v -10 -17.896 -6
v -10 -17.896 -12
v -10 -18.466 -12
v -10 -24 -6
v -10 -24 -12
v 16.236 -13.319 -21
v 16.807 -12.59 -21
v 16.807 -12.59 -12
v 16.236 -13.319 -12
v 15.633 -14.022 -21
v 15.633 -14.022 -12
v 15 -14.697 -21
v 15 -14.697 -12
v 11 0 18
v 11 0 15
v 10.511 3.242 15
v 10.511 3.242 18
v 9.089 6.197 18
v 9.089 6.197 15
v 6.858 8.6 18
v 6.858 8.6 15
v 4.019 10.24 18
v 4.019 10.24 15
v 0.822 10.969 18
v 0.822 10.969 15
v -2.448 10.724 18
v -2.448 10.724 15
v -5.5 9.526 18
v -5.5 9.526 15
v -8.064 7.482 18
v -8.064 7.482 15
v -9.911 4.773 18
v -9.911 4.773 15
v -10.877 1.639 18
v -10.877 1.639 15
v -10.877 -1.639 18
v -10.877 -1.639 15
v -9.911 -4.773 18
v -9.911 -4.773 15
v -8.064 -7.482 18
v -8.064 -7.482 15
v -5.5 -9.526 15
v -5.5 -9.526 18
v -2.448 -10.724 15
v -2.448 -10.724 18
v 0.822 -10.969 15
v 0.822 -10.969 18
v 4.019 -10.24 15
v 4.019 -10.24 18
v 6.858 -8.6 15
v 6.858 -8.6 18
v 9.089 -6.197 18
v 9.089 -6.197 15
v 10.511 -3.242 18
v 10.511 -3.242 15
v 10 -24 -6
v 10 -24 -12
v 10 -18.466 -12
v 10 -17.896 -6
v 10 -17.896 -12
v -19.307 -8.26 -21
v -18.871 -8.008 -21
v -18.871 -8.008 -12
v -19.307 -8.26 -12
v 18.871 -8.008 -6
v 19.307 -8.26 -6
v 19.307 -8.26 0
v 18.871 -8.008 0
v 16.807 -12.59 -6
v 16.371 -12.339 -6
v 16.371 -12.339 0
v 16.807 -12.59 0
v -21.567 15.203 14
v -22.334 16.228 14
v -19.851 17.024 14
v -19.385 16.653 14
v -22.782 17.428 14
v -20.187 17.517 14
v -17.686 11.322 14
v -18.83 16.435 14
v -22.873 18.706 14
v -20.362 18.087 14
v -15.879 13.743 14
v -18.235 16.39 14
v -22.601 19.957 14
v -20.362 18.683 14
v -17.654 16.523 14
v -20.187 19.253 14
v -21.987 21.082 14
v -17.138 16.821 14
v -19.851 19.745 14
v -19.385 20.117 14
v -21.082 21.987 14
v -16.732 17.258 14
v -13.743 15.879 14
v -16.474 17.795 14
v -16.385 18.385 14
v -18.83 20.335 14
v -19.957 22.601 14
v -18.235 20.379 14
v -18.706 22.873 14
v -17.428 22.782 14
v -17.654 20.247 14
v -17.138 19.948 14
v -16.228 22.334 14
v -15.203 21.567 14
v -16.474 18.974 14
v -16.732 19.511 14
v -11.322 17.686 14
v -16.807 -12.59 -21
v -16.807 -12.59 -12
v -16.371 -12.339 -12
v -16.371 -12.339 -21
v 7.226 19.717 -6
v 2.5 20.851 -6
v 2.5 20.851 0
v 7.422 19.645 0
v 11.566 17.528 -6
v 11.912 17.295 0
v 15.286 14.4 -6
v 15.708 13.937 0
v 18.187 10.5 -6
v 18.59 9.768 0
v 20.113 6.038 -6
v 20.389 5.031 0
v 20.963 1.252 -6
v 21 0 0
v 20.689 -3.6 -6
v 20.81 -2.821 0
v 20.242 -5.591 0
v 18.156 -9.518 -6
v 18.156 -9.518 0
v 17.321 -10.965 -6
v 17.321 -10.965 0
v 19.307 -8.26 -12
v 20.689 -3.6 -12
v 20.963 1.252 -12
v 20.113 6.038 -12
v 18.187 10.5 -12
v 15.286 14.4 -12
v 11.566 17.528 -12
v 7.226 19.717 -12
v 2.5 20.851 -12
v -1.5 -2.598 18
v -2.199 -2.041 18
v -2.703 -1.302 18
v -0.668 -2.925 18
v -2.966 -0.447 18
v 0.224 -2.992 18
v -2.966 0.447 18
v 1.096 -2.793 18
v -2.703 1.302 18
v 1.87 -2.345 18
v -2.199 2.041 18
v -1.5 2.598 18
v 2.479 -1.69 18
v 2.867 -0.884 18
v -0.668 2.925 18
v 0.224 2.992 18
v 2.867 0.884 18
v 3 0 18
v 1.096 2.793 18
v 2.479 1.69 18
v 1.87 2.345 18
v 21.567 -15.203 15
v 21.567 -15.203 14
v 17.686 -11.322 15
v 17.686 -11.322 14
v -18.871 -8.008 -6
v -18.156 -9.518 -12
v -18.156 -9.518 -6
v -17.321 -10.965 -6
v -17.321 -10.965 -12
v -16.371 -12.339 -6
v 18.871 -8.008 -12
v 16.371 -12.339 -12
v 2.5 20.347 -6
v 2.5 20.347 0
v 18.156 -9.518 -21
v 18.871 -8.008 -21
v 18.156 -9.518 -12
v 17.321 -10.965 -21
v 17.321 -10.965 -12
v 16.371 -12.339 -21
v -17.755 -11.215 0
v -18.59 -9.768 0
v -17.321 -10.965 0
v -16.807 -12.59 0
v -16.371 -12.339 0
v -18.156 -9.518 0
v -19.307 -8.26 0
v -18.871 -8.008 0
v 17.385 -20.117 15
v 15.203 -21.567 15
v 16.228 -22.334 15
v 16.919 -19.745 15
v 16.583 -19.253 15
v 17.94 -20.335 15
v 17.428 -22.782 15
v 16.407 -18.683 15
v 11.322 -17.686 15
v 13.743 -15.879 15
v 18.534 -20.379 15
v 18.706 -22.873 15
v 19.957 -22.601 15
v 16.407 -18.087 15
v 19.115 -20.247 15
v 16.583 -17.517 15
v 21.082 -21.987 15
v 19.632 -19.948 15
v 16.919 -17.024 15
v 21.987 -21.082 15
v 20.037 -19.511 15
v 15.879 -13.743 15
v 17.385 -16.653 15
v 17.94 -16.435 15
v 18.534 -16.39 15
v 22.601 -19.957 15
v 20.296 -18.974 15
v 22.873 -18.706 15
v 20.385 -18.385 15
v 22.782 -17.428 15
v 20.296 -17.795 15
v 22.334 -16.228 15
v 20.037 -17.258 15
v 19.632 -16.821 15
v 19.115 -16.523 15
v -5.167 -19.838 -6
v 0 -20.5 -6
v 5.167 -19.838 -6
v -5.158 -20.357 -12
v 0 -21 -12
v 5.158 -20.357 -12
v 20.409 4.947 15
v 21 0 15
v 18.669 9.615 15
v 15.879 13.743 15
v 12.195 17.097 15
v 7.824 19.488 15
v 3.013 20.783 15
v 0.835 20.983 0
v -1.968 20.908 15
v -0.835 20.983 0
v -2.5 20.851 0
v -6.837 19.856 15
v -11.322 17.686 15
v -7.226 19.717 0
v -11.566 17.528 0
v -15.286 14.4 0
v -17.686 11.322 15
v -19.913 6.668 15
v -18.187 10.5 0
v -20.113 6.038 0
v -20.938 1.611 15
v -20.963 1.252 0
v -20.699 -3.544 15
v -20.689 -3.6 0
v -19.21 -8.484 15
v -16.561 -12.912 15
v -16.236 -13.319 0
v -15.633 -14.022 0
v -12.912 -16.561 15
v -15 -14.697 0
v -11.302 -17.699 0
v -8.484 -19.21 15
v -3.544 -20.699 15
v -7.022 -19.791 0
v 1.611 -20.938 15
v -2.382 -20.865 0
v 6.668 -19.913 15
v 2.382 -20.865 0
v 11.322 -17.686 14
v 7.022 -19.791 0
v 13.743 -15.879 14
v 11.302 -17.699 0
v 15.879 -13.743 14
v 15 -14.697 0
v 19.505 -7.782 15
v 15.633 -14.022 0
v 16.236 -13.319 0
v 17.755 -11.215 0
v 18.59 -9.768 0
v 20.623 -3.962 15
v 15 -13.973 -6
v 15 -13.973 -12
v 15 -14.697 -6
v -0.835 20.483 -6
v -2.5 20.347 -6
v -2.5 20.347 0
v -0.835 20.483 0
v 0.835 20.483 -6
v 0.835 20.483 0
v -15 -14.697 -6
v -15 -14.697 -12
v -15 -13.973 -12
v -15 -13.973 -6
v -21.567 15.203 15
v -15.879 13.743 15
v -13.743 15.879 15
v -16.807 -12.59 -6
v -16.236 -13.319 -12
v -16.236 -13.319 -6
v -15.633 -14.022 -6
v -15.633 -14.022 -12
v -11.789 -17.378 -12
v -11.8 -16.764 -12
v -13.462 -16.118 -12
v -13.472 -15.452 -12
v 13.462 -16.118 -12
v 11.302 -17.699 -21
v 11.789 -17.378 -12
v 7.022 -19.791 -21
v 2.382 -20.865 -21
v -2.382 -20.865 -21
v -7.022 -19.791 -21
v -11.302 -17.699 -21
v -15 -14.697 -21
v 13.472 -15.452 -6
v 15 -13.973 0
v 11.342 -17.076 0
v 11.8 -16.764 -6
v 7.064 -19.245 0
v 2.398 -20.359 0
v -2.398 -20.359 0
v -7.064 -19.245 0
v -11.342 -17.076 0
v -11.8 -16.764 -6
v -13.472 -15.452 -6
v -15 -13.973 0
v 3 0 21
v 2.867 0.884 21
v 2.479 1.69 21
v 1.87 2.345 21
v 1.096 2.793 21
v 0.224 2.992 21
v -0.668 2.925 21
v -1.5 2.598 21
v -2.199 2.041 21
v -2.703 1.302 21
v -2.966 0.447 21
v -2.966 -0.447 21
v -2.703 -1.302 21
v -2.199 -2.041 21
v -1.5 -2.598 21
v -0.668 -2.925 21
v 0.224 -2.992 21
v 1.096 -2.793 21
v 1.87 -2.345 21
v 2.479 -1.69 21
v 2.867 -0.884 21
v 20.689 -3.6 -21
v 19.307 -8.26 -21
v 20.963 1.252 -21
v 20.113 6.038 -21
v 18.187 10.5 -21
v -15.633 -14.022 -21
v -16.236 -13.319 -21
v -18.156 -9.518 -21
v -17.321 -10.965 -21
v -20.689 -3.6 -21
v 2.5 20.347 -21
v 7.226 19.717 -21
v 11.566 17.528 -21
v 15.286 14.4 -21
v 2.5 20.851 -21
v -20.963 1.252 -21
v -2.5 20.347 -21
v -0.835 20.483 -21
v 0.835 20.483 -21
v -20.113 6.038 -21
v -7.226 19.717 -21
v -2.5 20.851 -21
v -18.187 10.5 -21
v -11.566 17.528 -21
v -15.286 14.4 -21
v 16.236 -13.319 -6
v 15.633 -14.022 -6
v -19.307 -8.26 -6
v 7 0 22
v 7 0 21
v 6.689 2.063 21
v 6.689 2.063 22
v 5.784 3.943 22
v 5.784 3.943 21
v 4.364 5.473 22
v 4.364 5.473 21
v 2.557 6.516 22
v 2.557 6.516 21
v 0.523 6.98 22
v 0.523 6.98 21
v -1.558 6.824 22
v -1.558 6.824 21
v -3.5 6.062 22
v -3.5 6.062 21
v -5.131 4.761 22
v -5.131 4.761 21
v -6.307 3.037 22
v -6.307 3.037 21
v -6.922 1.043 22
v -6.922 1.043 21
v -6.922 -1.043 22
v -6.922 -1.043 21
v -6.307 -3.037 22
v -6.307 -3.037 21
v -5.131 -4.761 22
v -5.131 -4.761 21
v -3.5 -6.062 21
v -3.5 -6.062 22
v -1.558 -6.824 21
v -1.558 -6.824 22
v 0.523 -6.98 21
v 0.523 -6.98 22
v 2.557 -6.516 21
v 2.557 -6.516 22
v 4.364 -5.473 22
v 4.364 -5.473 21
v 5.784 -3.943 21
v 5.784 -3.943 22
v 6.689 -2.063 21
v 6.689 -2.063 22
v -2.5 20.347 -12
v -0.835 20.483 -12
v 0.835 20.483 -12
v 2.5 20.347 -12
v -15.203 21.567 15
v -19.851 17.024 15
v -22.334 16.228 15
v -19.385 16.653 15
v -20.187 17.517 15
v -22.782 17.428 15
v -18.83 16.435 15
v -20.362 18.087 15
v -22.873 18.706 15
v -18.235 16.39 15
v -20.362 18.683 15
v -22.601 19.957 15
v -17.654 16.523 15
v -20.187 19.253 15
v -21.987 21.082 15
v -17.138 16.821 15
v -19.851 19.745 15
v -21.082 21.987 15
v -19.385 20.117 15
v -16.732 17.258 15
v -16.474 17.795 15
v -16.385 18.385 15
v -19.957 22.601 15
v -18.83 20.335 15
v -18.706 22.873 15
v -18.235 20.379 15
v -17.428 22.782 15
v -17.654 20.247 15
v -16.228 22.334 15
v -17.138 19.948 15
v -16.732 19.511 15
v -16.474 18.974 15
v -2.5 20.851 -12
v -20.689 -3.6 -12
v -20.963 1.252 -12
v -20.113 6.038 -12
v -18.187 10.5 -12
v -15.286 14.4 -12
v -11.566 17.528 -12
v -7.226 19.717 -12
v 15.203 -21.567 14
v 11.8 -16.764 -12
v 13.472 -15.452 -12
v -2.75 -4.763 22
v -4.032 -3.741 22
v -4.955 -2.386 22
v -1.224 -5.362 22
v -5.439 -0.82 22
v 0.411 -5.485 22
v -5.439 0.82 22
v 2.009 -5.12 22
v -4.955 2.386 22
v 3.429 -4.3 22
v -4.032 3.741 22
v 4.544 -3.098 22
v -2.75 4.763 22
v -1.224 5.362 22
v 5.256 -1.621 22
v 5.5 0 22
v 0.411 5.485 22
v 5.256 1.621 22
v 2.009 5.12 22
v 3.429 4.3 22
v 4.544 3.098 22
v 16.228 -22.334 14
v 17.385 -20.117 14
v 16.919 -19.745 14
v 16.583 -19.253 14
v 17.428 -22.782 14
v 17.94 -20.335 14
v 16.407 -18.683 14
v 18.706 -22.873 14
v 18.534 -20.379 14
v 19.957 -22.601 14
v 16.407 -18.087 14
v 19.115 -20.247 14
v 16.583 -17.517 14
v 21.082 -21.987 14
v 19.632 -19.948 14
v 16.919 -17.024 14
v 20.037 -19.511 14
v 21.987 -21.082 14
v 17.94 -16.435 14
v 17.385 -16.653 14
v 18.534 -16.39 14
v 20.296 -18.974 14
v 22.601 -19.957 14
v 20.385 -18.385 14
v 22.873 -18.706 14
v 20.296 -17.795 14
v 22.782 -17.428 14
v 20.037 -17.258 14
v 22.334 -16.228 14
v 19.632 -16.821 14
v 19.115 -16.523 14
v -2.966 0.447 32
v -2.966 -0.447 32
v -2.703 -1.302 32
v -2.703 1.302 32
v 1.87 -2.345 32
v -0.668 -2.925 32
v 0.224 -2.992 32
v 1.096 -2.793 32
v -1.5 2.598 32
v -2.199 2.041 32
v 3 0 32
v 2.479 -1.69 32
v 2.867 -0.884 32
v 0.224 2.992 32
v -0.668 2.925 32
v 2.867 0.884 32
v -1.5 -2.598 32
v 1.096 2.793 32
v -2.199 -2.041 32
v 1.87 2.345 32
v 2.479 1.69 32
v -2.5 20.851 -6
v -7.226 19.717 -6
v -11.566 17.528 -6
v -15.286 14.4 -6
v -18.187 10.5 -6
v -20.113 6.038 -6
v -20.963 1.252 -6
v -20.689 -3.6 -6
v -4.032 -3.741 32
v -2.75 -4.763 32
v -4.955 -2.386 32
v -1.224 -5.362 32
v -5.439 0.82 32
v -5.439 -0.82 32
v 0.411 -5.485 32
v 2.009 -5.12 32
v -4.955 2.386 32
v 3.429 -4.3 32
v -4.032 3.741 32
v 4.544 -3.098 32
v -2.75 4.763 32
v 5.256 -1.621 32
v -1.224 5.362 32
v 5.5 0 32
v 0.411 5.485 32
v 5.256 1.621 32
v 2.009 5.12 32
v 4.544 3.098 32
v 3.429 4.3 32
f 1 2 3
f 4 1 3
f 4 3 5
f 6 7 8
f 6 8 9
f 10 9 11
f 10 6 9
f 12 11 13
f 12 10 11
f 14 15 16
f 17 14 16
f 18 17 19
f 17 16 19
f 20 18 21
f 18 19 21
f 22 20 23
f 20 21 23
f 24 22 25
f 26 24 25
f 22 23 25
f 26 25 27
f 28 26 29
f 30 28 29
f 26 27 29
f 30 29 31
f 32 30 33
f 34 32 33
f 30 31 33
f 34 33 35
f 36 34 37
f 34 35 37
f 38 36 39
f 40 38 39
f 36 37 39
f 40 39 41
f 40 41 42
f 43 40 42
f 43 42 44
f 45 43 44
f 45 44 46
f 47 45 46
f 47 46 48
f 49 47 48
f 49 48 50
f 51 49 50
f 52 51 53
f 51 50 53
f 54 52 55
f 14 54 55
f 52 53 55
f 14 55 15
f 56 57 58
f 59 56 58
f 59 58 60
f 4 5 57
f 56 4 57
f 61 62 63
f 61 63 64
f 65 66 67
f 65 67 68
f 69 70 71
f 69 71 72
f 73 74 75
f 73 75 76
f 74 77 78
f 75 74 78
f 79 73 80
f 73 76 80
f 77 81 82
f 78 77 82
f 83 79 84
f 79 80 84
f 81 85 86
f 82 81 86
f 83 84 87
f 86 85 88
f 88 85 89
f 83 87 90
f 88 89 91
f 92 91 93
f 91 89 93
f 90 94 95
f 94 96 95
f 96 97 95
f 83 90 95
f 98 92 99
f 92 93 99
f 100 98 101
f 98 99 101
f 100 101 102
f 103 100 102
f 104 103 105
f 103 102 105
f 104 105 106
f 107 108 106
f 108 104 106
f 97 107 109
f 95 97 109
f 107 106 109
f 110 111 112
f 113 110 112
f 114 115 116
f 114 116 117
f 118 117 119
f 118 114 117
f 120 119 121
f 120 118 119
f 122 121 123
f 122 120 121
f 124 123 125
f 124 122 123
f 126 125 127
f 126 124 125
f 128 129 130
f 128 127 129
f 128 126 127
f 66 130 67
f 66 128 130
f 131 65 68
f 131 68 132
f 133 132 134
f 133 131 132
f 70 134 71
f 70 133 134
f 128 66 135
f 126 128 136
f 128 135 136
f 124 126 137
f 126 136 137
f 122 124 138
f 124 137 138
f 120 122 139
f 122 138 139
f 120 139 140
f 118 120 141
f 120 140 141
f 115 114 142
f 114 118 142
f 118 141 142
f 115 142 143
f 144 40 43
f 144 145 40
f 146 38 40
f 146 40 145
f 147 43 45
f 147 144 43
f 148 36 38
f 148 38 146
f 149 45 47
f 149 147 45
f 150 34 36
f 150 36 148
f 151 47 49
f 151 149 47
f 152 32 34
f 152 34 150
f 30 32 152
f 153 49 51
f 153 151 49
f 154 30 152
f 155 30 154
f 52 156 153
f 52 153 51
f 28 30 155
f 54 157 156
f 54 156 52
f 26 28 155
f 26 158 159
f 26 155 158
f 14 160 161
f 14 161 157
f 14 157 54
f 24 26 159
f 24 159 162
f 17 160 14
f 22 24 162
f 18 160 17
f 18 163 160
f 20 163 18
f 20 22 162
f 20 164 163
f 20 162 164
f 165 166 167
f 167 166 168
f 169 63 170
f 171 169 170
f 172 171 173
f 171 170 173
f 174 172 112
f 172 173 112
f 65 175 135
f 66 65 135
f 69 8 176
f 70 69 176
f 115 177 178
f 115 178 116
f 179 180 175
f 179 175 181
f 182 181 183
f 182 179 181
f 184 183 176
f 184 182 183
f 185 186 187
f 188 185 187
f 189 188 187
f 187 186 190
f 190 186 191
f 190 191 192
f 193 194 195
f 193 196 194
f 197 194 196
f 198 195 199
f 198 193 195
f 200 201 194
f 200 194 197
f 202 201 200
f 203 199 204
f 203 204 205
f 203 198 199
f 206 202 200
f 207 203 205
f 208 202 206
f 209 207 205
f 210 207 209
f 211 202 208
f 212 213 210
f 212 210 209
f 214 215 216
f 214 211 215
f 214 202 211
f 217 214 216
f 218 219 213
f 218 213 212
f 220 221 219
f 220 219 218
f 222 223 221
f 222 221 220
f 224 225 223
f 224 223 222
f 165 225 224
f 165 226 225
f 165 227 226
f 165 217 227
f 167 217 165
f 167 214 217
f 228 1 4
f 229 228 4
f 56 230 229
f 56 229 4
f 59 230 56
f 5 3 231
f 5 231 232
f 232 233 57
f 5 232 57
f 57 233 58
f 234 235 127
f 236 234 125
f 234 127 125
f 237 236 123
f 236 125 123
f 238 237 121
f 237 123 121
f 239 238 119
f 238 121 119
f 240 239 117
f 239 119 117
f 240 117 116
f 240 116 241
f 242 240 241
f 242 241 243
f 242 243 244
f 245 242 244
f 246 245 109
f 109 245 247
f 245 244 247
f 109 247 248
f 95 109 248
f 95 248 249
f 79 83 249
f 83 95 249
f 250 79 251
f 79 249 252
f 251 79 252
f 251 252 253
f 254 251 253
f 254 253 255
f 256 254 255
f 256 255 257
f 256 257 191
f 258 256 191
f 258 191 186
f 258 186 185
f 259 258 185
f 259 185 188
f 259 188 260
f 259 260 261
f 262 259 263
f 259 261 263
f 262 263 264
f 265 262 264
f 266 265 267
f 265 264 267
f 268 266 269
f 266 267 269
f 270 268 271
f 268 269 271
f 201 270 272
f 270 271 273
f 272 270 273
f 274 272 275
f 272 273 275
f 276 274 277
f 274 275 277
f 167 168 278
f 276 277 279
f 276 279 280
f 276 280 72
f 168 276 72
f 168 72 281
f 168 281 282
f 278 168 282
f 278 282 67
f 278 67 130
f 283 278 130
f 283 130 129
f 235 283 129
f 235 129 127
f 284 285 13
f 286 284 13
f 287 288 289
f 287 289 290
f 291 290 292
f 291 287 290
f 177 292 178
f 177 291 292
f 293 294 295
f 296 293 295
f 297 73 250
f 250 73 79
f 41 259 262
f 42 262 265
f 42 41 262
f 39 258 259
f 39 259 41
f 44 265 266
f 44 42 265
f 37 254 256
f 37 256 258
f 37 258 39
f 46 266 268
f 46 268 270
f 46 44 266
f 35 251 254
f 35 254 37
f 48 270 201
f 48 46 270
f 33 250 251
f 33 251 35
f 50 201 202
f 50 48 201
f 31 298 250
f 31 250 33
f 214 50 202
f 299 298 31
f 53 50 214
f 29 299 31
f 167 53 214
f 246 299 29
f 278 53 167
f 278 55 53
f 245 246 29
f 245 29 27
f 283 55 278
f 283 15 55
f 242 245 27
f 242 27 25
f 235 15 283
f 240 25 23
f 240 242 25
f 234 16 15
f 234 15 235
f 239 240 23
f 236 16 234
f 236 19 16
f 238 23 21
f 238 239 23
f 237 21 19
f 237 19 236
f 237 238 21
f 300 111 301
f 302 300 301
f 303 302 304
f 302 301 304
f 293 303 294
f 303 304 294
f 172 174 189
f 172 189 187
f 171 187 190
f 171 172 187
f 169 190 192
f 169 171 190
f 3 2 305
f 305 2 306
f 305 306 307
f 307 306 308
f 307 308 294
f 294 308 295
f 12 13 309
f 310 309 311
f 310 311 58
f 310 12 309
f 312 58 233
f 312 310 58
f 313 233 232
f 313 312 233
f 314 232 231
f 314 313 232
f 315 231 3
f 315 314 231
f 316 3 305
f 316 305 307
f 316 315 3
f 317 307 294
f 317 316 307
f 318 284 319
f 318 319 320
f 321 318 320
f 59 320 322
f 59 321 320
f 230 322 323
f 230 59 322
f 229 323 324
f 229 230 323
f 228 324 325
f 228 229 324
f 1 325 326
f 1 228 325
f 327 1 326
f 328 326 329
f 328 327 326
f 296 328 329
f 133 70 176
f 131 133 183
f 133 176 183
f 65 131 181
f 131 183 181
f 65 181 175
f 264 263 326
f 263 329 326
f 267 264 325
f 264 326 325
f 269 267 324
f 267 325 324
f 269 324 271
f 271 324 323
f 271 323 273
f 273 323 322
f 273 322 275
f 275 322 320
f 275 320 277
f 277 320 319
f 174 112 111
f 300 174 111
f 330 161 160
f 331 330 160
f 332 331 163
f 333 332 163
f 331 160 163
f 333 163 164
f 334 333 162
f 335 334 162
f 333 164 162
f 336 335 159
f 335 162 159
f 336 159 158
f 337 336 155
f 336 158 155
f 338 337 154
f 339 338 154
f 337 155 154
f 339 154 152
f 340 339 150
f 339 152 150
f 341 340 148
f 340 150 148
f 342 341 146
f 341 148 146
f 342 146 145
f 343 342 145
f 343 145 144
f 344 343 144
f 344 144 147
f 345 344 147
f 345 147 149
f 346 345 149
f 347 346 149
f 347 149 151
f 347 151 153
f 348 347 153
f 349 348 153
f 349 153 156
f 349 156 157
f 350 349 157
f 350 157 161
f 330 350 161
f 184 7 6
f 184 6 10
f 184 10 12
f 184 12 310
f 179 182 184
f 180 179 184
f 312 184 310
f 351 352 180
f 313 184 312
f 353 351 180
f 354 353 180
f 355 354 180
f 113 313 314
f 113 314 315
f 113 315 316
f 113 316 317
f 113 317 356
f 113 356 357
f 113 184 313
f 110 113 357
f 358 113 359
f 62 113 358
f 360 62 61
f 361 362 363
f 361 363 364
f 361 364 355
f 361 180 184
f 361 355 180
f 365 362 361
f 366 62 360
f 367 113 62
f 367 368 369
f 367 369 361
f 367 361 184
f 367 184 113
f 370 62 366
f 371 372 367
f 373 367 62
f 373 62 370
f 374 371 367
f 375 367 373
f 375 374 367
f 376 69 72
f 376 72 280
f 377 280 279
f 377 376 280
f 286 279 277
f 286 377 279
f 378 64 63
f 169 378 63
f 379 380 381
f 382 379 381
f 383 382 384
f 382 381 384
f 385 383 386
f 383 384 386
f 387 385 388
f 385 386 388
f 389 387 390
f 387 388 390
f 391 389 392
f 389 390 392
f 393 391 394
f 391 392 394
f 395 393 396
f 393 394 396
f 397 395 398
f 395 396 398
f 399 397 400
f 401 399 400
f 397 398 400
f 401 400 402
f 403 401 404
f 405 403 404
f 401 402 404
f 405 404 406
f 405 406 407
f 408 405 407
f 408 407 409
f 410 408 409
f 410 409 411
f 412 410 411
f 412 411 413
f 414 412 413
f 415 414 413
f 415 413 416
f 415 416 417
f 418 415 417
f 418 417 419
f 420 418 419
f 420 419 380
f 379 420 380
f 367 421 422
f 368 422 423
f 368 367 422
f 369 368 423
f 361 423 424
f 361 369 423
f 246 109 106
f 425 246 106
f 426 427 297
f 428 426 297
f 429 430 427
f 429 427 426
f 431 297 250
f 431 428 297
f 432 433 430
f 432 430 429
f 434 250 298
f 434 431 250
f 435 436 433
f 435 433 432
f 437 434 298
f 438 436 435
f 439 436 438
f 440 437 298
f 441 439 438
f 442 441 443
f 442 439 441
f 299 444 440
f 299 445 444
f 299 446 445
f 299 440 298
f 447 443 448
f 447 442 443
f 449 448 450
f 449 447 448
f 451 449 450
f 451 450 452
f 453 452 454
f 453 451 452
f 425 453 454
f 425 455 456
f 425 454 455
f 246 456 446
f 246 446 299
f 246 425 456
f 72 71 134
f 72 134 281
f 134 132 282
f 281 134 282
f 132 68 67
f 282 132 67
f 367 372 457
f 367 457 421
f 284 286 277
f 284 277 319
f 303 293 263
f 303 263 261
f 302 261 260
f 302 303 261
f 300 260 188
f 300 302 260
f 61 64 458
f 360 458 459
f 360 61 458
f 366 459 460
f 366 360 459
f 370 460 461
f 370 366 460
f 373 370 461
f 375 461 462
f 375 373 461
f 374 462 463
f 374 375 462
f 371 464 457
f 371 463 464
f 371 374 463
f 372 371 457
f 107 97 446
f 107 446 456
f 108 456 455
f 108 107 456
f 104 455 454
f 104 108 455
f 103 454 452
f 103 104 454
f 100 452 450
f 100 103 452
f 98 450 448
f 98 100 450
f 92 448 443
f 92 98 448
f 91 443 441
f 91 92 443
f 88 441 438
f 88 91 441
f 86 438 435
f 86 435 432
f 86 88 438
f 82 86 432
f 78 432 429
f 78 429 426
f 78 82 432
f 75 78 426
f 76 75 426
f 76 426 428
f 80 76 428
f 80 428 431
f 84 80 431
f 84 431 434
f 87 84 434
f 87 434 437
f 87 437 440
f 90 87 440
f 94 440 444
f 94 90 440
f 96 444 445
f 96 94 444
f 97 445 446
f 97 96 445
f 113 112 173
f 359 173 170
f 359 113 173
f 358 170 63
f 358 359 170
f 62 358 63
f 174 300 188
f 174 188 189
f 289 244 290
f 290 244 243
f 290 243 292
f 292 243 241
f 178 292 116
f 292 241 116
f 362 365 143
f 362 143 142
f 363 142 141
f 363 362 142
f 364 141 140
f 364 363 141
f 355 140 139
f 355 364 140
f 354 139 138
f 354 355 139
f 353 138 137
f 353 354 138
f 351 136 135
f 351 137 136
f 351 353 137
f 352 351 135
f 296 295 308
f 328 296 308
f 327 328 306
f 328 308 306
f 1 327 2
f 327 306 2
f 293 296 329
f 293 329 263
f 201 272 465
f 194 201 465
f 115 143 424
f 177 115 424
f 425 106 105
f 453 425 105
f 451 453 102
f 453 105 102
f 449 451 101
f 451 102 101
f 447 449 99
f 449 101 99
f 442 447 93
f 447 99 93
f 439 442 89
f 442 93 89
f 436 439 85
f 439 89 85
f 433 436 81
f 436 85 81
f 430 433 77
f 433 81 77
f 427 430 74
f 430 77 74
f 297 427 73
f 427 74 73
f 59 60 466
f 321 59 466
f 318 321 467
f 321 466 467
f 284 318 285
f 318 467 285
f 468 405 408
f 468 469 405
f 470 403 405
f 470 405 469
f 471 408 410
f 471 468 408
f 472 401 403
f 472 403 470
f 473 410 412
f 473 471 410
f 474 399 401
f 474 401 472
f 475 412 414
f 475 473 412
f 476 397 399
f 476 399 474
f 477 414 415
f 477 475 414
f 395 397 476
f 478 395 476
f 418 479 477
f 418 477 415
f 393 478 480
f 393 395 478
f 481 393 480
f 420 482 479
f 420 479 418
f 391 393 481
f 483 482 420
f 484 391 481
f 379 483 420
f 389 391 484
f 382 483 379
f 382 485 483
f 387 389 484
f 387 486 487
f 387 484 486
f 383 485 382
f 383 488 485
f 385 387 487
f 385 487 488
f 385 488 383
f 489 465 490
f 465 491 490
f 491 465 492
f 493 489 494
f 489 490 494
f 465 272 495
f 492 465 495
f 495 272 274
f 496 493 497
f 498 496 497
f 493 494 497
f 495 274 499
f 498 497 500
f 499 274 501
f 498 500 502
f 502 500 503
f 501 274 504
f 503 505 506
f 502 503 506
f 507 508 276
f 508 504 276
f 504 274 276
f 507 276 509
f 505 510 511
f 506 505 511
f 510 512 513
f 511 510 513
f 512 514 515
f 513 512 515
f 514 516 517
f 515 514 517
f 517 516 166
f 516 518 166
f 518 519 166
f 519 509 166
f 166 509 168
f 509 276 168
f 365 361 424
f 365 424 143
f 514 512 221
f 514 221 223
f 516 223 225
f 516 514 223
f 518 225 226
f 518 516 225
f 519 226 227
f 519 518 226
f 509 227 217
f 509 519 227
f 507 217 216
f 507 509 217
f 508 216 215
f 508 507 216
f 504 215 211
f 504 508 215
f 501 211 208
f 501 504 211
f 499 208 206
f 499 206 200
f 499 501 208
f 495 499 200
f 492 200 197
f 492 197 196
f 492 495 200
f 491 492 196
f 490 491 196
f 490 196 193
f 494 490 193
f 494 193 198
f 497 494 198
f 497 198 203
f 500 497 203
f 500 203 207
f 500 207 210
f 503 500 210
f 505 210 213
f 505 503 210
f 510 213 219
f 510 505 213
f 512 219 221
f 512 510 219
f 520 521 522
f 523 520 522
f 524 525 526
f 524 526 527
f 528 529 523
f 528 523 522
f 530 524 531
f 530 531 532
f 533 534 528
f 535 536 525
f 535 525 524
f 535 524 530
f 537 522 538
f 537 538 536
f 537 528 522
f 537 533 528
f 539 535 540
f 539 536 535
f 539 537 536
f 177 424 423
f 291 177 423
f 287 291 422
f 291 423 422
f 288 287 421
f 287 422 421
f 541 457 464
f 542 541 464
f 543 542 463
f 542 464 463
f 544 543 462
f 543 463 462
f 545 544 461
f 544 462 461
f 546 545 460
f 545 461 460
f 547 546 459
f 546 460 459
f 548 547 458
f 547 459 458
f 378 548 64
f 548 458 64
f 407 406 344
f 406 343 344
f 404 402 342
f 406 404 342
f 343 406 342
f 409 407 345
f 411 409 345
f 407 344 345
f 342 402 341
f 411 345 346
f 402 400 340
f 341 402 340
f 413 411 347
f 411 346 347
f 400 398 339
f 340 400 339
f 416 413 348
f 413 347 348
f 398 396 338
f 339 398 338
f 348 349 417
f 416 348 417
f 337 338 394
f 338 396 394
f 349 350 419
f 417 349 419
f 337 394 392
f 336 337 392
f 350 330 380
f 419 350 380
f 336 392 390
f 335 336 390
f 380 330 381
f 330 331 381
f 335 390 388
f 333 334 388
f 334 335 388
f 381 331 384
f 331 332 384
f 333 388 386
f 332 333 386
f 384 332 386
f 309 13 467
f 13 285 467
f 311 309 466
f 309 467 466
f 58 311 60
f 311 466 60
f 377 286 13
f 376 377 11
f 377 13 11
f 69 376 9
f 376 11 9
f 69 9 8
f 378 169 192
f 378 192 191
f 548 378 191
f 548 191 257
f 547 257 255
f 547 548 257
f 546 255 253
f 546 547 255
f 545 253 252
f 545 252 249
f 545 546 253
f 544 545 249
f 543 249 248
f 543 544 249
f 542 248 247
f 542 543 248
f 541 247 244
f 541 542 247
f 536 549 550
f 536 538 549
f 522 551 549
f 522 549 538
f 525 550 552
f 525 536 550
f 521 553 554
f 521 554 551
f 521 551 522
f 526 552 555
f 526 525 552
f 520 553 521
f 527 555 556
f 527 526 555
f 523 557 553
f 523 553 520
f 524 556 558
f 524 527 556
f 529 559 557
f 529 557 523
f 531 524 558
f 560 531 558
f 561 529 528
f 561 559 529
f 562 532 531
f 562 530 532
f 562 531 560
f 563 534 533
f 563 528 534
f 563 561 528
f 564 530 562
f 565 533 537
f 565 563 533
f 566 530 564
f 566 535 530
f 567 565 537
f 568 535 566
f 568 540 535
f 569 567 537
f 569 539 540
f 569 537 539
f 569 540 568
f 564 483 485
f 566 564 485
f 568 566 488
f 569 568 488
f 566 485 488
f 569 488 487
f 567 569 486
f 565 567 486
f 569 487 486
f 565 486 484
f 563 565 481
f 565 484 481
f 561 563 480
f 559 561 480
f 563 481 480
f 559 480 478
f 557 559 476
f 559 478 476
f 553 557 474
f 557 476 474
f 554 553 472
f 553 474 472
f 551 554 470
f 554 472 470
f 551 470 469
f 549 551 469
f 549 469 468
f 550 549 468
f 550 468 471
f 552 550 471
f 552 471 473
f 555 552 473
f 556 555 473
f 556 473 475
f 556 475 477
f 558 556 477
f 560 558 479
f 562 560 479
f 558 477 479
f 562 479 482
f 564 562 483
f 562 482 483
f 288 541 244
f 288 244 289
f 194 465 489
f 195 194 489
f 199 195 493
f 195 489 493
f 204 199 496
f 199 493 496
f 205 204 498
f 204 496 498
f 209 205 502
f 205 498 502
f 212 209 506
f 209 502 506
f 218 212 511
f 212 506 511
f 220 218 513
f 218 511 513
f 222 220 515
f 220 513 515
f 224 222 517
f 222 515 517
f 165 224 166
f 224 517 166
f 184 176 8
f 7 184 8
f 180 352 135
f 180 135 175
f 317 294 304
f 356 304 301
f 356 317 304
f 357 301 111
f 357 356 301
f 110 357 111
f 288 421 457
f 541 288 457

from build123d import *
from build123d.topology import SkipClean

# Parameters (mm, degrees)
SKETCH_1_R          = 21
EXTRUDE_1_DEPTH     = 15
EXTRUDE_START       = 6
EXTRUDE_2_DEPTH     = 6
EXTRUDE_3_DEPTH     = 6
EXTRUDE_START_2     = 9
EXTRUDE_4_DEPTH     = 9
SKETCH_6_R          = 11
EXTRUDE_5_DEPTH     = 3
SKETCH_7_R          = 3
EXTRUDE_6_DEPTH     = 14
EXTRUDE_START_3     = -1
SKETCH_8_R          = 2
EXTRUDE_7_DEPTH     = 1
EXTRUDE_START_4     = -11
SKETCH_9_R          = 7
SKETCH_9_R_2        = 3
EXTRUDE_8_DEPTH     = 11
CUT_EXTRUDE_START   = -10
SKETCH_10_R         = 7
SKETCH_10_R_2       = 5.5
CUT_EXTRUDE_1_DEPTH = 10


with BuildPart() as part:
    # 草图1 → 凸台-拉伸1 (new body)
    with BuildSketch(Plane.XY):
        Circle(SKETCH_1_R)
    extrude(amount=EXTRUDE_1_DEPTH)

    # 草图2 → 凸台-拉伸2 (add)
    with SkipClean():  # the faces are left unmerged after this step: merging them gives an invalid solid
        with BuildSketch(Plane(origin=(0, 0, 0), x_dir=(-1, 0, 0), z_dir=(0, 0, -1)).offset(EXTRUDE_START)):
            with BuildLine():
                Line((2.5, 20.850659462), (2.5, 20.346989949))
                ThreePointArc((2.5, 20.346989949), (0, 20.5), (-2.5, 20.346989949))
                Line((-2.5, 20.346989949), (-2.5, 20.850659462))
                ThreePointArc((-2.5, 20.850659462), (-18.186533479, 10.5), (-19.30720078, -8.260266222))
                Line((-19.30720078, -8.260266222), (-18.871010187, -8.008431465))
                ThreePointArc((-18.871010187, -8.008431465), (-17.753520778, -10.25), (-16.371010187, -12.338558484))
                Line((-16.371010187, -12.338558484), (-16.80720078, -12.59039324))
                ThreePointArc((-16.80720078, -12.59039324), (-15.938440593, -13.673555187), (-15, -14.696938457))
                Line((-15, -14.696938457), (-15, -13.973188612))
                ThreePointArc((-15, -13.973188612), (0, -20.5), (15, -13.973188612))
                Line((15, -13.973188612), (15, -14.696938457))
                ThreePointArc((15, -14.696938457), (15.938440593, -13.673555187), (16.80720078, -12.59039324))
                Line((16.80720078, -12.59039324), (16.371010187, -12.338558484))
                ThreePointArc((16.371010187, -12.338558484), (17.753520778, -10.25), (18.871010187, -8.008431465))
                Line((18.871010187, -8.008431465), (19.30720078, -8.260266222))
                ThreePointArc((19.30720078, -8.260266222), (18.186533479, 10.5), (2.5, 20.850659462))
            make_face()
        extrude(amount=-EXTRUDE_2_DEPTH)

    # 草图4 → 凸台-拉伸3 (add)
    with SkipClean():  # the faces are left unmerged after this step: merging them gives an invalid solid
        with BuildSketch(Plane(origin=(0, 0, -6), x_dir=(-1, 0, 0), z_dir=(0, 0, -1)).offset(EXTRUDE_START)):
            with BuildLine():
                Line((10, -17.895530168), (10, -24))
                Line((10, -24), (-10, -24))
                Line((-10, -24), (-10, -17.895530168))
                ThreePointArc((-10, -17.895530168), (-12.652912345, -16.129284212), (-15, -13.973188612))
                Line((-15, -13.973188612), (-15, -14.696938457))
                ThreePointArc((-15, -14.696938457), (-15.938440593, -13.673555187), (-16.80720078, -12.59039324))
                Line((-16.80720078, -12.59039324), (-16.371010187, -12.338558484))
                ThreePointArc((-16.371010187, -12.338558484), (-17.753520778, -10.25), (-18.871010187, -8.008431465))
                Line((-18.871010187, -8.008431465), (-19.30720078, -8.260266222))
                ThreePointArc((-19.30720078, -8.260266222), (-18.186533479, 10.5), (-2.5, 20.850659462))
                Line((-2.5, 20.850659462), (-2.5, 20.346989949))
                ThreePointArc((-2.5, 20.346989949), (0, 20.5), (2.5, 20.346989949))
                Line((2.5, 20.346989949), (2.5, 20.850659462))
                ThreePointArc((2.5, 20.850659462), (18.186533479, 10.5), (19.30720078, -8.260266222))
                Line((19.30720078, -8.260266222), (18.871010187, -8.008431465))
                ThreePointArc((18.871010187, -8.008431465), (17.753520778, -10.25), (16.371010187, -12.338558484))
                Line((16.371010187, -12.338558484), (16.80720078, -12.59039324))
                ThreePointArc((16.80720078, -12.59039324), (15.938440593, -13.673555187), (15, -14.696938457))
                Line((15, -14.696938457), (15, -13.973188612))
                ThreePointArc((15, -13.973188612), (12.652912345, -16.129284212), (10, -17.895530168))
            make_face()
        extrude(amount=-EXTRUDE_3_DEPTH)

    # 草图5 → 凸台-拉伸4 (add)
    with SkipClean():  # the faces are left unmerged after this step: merging them gives an invalid solid
        with BuildSketch(Plane(origin=(0, 0, -12), x_dir=(-1, 0, 0), z_dir=(0, 0, -1)).offset(EXTRUDE_START_2)):
            with BuildLine():
                Line((18.871010187, -8.008431465), (19.30720078, -8.260266222))
                ThreePointArc((19.30720078, -8.260266222), (18.186533479, 10.5), (2.5, 20.850659462))
                Line((2.5, 20.850659462), (2.5, 20.346989949))
                ThreePointArc((2.5, 20.346989949), (0, 20.5), (-2.5, 20.346989949))
                Line((-2.5, 20.346989949), (-2.5, 20.850659462))
                ThreePointArc((-2.5, 20.850659462), (-18.186533479, 10.5), (-19.30720078, -8.260266222))
                Line((-19.30720078, -8.260266222), (-18.871010187, -8.008431465))
                ThreePointArc((-18.871010187, -8.008431465), (-17.753520778, -10.25), (-16.371010187, -12.338558484))
                Line((-16.371010187, -12.338558484), (-16.80720078, -12.59039324))
                ThreePointArc((-16.80720078, -12.59039324), (-15.938440593, -13.673555187), (-15, -14.696938457))
                ThreePointArc((-15, -14.696938457), (0, -21), (15, -14.696938457))
                ThreePointArc((15, -14.696938457), (15.938440593, -13.673555187), (16.80720078, -12.59039324))
                Line((16.80720078, -12.59039324), (16.371010187, -12.338558484))
                ThreePointArc((16.371010187, -12.338558484), (17.753520778, -10.25), (18.871010187, -8.008431465))
            make_face()
        extrude(amount=-EXTRUDE_4_DEPTH)

    # 草图6 → 凸台-拉伸5 (add)
    with SkipClean():  # the faces are left unmerged after this step: merging them gives an invalid solid
        with BuildSketch(Plane.XY.offset(15)):
            Circle(SKETCH_6_R)
        extrude(amount=EXTRUDE_5_DEPTH)

    # 草图7 → 凸台-拉伸6 (add)
    with SkipClean():  # the faces are left unmerged after this step: merging them gives an invalid solid
        with BuildSketch(Plane.XY.offset(18)):
            Circle(SKETCH_7_R)
        extrude(amount=EXTRUDE_6_DEPTH)

    # 草图8 → 凸台-拉伸7 (add)
    # profile 1 of 2: a face of its own
    with SkipClean():  # the faces are left unmerged after this step: merging them gives an invalid solid
        with BuildSketch(Plane.XY.offset(15).offset(EXTRUDE_START_3)):
            with BuildLine():
                Line((21.566756826, -15.202795796), (17.68629022, -11.322329189))
                ThreePointArc((17.68629022, -11.322329189), (14.849242405, -14.849242405), (11.322329189, -17.68629022))
                Line((11.322329189, -17.68629022), (15.202795796, -21.566756826))
                ThreePointArc((15.202795796, -21.566756826), (21.566756826, -21.566756826), (21.566756826, -15.202795796))
            make_face()
            with Locations((18.384776311, -18.384776311)):
                Circle(SKETCH_8_R, mode=Mode.SUBTRACT)
        # profile 2 of 2: a face of its own
        with BuildSketch(Plane.XY.offset(15).offset(EXTRUDE_START_3)):
            with BuildLine():
                Line((-11.322329189, 17.68629022), (-15.202795796, 21.566756826))
                ThreePointArc((-15.202795796, 21.566756826), (-21.566756826, 21.566756826), (-21.566756826, 15.202795796))
                Line((-21.566756826, 15.202795796), (-17.68629022, 11.322329189))
                ThreePointArc((-17.68629022, 11.322329189), (-14.849242405, 14.849242405), (-11.322329189, 17.68629022))
            make_face()
            with Locations((-18.384776311, 18.384776311)):
                Circle(SKETCH_8_R, mode=Mode.SUBTRACT)
        extrude(amount=EXTRUDE_7_DEPTH)

    # 草图9 → 凸台-拉伸8 (add)
    with SkipClean():  # the faces are left unmerged after this step: merging them gives an invalid solid
        with BuildSketch(Plane.XY.offset(32).offset(EXTRUDE_START_4)):
            Circle(SKETCH_9_R)
            Circle(SKETCH_9_R_2, mode=Mode.SUBTRACT)
        extrude(amount=EXTRUDE_8_DEPTH)

    # 草图10 → 切除-拉伸1 (cut)
    with SkipClean():  # the faces are left unmerged after this step: merging them gives an invalid solid
        with BuildSketch(Plane.XY.offset(32).offset(CUT_EXTRUDE_START)):
            Circle(SKETCH_10_R)
            Circle(SKETCH_10_R_2, mode=Mode.SUBTRACT)
        extrude(amount=CUT_EXTRUDE_1_DEPTH, mode=Mode.SUBTRACT)


solid = part.part
